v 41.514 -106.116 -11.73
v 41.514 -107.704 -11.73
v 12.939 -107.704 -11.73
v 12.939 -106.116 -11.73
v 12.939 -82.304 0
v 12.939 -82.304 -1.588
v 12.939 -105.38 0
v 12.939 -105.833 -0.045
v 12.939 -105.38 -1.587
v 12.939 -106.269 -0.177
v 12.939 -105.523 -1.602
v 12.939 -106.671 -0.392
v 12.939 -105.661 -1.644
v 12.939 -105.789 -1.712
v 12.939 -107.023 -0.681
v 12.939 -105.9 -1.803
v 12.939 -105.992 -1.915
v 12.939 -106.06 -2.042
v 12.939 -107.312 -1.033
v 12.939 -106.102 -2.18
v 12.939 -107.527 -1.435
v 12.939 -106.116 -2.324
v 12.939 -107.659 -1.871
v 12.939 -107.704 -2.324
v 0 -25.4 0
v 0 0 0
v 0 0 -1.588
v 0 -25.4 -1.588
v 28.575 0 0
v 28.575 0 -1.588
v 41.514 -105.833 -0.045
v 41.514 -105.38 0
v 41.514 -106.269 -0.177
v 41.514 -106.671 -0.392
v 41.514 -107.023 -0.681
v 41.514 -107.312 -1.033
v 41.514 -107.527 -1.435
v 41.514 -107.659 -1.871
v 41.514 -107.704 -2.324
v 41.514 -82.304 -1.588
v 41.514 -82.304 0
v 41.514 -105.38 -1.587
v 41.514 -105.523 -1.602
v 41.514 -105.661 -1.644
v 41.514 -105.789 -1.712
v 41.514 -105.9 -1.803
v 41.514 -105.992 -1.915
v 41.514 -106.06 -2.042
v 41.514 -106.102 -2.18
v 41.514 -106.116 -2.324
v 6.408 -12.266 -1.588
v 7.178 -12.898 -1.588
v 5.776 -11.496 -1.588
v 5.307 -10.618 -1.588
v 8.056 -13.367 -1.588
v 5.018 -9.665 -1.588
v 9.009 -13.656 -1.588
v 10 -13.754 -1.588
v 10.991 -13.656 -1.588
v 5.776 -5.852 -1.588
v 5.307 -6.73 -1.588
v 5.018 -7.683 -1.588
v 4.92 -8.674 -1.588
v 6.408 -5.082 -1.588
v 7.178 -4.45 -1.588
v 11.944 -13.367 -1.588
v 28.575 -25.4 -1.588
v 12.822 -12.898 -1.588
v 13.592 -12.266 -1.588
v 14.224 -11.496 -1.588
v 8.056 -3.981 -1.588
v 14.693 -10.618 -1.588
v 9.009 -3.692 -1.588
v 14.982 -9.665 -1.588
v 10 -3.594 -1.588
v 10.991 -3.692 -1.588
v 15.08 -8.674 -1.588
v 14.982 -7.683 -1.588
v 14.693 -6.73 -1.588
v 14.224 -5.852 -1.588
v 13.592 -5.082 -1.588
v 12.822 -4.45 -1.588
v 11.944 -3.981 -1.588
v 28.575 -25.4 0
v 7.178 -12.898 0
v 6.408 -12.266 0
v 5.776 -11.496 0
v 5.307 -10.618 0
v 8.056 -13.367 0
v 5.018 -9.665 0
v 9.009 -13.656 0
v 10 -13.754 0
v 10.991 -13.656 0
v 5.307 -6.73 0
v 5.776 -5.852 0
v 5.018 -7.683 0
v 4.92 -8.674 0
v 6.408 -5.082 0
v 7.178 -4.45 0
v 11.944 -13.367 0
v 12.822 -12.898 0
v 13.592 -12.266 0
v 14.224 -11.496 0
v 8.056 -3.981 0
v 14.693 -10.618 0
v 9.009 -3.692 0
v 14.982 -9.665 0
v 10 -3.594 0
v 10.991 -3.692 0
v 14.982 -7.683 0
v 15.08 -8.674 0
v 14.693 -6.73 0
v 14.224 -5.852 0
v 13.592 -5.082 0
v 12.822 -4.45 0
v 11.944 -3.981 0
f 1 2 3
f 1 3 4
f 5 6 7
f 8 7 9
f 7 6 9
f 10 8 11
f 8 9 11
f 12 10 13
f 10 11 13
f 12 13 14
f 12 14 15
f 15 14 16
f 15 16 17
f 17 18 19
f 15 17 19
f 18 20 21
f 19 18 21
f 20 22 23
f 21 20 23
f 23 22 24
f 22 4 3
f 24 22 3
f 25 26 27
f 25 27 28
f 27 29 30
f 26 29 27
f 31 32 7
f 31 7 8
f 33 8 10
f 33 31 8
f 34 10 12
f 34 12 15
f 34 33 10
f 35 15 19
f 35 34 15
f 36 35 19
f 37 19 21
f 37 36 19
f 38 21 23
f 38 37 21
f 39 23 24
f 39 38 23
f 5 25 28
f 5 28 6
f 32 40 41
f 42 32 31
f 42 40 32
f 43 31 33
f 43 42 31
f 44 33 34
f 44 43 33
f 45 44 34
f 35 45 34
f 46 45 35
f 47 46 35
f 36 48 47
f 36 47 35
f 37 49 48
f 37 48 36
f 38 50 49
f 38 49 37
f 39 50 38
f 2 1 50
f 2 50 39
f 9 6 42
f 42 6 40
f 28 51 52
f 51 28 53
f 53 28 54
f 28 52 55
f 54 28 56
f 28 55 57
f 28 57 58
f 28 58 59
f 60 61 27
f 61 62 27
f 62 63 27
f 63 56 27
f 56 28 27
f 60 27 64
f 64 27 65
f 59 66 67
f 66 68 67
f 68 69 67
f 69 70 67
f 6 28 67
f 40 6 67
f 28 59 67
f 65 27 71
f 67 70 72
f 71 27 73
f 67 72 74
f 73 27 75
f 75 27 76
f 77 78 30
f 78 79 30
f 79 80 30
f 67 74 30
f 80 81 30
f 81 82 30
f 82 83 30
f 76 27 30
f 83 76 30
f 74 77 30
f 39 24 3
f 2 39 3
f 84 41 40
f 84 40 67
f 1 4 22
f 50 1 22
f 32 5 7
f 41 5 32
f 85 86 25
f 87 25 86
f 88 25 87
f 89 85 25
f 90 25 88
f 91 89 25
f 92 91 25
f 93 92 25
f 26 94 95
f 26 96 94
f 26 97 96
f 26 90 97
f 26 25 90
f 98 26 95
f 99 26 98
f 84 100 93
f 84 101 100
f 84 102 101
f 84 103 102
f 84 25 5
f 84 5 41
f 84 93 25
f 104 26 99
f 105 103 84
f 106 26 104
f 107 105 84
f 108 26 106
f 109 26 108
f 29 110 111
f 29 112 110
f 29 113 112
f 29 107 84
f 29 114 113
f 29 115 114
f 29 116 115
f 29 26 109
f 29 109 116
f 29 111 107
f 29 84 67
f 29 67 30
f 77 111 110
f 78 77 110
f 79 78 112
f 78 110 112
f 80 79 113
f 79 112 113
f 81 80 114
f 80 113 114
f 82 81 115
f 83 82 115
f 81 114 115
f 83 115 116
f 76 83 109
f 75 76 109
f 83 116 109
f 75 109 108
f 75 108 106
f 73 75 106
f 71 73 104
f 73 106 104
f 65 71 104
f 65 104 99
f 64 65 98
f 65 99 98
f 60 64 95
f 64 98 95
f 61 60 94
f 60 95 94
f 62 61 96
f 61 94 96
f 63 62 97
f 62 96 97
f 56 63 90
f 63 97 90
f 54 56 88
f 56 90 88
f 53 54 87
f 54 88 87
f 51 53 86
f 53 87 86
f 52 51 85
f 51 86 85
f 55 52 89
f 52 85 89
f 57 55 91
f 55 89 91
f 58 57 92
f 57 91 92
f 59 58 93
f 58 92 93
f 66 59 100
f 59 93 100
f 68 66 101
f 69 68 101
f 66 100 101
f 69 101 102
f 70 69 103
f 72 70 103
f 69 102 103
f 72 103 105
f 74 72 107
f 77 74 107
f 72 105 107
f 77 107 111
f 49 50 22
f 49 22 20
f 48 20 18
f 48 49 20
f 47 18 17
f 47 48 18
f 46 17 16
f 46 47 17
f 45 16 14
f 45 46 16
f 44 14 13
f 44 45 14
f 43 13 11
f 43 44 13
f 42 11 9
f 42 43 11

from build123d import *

# Parameters (mm, degrees)
SKETCH1_R                    = 5.08
BASE_FLANGE1_DEPTH           = 1.5875
EDGE_FLANGE1_STRIP_W         = 7.8232
EDGE_FLANGE1_STRIP_H         = 1.5875
EDGE_FLANGE1_STRIP_CUT_DEPTH = 28.575
EDGE_FLANGE1_DEPTH           = 28.575


# Sheet-metal steps are written as plain solids
with BuildPart() as part:
    # Sketch1 → Base-Flange1 (new body)
    with BuildSketch(Plane.XY):
        Polygon((0, -25.4), (12.93876, -82.30362), (12.93876, -107.70362), (41.51376, -107.70362), (41.51376, -82.30362), (28.575, -25.4), (28.575, 0), (0, 0), align=None)
        with Locations((9.99998, -8.6741)):
            Circle(SKETCH1_R, mode=Mode.SUBTRACT)
    extrude(amount=-BASE_FLANGE1_DEPTH)

    # Edge-Flange1 strip (across the edge) → Edge-Flange1 strip cut (cut)
    with BuildSketch(Plane(origin=(41.51376, -107.70362, -1.5875), x_dir=(0, 1, 0), z_dir=(-1, 0, 0))):
        with Locations((-1.5875, -0.79375)):
            Rectangle(EDGE_FLANGE1_STRIP_W, EDGE_FLANGE1_STRIP_H)
    extrude(amount=EDGE_FLANGE1_STRIP_CUT_DEPTH, mode=Mode.SUBTRACT)

    # Edge-Flange1 section (across the edge) → Edge-Flange1 (add)
    with BuildSketch(Plane(origin=(41.51376, -107.70362, -1.5875), x_dir=(0, 1, 0), z_dir=(-1, 0, 0))):
        with BuildLine():
            Line((0, 0.7366), (0, 10.14222))
            Line((0, 10.14222), (1.5875, 10.14222))
            Line((1.5875, 10.14222), (1.5875, 0.7366))
            ThreePointArc((1.5875, 0.7366), (1.803245145, 0.215745145), (2.3241, 0))
            Line((2.3241, 0), (2.3241, -1.5875))
            ThreePointArc((2.3241, -1.5875), (0.68071313, -0.90678687), (0, 0.7366))
        make_face()
    extrude(amount=EDGE_FLANGE1_DEPTH)


solid = part.part
